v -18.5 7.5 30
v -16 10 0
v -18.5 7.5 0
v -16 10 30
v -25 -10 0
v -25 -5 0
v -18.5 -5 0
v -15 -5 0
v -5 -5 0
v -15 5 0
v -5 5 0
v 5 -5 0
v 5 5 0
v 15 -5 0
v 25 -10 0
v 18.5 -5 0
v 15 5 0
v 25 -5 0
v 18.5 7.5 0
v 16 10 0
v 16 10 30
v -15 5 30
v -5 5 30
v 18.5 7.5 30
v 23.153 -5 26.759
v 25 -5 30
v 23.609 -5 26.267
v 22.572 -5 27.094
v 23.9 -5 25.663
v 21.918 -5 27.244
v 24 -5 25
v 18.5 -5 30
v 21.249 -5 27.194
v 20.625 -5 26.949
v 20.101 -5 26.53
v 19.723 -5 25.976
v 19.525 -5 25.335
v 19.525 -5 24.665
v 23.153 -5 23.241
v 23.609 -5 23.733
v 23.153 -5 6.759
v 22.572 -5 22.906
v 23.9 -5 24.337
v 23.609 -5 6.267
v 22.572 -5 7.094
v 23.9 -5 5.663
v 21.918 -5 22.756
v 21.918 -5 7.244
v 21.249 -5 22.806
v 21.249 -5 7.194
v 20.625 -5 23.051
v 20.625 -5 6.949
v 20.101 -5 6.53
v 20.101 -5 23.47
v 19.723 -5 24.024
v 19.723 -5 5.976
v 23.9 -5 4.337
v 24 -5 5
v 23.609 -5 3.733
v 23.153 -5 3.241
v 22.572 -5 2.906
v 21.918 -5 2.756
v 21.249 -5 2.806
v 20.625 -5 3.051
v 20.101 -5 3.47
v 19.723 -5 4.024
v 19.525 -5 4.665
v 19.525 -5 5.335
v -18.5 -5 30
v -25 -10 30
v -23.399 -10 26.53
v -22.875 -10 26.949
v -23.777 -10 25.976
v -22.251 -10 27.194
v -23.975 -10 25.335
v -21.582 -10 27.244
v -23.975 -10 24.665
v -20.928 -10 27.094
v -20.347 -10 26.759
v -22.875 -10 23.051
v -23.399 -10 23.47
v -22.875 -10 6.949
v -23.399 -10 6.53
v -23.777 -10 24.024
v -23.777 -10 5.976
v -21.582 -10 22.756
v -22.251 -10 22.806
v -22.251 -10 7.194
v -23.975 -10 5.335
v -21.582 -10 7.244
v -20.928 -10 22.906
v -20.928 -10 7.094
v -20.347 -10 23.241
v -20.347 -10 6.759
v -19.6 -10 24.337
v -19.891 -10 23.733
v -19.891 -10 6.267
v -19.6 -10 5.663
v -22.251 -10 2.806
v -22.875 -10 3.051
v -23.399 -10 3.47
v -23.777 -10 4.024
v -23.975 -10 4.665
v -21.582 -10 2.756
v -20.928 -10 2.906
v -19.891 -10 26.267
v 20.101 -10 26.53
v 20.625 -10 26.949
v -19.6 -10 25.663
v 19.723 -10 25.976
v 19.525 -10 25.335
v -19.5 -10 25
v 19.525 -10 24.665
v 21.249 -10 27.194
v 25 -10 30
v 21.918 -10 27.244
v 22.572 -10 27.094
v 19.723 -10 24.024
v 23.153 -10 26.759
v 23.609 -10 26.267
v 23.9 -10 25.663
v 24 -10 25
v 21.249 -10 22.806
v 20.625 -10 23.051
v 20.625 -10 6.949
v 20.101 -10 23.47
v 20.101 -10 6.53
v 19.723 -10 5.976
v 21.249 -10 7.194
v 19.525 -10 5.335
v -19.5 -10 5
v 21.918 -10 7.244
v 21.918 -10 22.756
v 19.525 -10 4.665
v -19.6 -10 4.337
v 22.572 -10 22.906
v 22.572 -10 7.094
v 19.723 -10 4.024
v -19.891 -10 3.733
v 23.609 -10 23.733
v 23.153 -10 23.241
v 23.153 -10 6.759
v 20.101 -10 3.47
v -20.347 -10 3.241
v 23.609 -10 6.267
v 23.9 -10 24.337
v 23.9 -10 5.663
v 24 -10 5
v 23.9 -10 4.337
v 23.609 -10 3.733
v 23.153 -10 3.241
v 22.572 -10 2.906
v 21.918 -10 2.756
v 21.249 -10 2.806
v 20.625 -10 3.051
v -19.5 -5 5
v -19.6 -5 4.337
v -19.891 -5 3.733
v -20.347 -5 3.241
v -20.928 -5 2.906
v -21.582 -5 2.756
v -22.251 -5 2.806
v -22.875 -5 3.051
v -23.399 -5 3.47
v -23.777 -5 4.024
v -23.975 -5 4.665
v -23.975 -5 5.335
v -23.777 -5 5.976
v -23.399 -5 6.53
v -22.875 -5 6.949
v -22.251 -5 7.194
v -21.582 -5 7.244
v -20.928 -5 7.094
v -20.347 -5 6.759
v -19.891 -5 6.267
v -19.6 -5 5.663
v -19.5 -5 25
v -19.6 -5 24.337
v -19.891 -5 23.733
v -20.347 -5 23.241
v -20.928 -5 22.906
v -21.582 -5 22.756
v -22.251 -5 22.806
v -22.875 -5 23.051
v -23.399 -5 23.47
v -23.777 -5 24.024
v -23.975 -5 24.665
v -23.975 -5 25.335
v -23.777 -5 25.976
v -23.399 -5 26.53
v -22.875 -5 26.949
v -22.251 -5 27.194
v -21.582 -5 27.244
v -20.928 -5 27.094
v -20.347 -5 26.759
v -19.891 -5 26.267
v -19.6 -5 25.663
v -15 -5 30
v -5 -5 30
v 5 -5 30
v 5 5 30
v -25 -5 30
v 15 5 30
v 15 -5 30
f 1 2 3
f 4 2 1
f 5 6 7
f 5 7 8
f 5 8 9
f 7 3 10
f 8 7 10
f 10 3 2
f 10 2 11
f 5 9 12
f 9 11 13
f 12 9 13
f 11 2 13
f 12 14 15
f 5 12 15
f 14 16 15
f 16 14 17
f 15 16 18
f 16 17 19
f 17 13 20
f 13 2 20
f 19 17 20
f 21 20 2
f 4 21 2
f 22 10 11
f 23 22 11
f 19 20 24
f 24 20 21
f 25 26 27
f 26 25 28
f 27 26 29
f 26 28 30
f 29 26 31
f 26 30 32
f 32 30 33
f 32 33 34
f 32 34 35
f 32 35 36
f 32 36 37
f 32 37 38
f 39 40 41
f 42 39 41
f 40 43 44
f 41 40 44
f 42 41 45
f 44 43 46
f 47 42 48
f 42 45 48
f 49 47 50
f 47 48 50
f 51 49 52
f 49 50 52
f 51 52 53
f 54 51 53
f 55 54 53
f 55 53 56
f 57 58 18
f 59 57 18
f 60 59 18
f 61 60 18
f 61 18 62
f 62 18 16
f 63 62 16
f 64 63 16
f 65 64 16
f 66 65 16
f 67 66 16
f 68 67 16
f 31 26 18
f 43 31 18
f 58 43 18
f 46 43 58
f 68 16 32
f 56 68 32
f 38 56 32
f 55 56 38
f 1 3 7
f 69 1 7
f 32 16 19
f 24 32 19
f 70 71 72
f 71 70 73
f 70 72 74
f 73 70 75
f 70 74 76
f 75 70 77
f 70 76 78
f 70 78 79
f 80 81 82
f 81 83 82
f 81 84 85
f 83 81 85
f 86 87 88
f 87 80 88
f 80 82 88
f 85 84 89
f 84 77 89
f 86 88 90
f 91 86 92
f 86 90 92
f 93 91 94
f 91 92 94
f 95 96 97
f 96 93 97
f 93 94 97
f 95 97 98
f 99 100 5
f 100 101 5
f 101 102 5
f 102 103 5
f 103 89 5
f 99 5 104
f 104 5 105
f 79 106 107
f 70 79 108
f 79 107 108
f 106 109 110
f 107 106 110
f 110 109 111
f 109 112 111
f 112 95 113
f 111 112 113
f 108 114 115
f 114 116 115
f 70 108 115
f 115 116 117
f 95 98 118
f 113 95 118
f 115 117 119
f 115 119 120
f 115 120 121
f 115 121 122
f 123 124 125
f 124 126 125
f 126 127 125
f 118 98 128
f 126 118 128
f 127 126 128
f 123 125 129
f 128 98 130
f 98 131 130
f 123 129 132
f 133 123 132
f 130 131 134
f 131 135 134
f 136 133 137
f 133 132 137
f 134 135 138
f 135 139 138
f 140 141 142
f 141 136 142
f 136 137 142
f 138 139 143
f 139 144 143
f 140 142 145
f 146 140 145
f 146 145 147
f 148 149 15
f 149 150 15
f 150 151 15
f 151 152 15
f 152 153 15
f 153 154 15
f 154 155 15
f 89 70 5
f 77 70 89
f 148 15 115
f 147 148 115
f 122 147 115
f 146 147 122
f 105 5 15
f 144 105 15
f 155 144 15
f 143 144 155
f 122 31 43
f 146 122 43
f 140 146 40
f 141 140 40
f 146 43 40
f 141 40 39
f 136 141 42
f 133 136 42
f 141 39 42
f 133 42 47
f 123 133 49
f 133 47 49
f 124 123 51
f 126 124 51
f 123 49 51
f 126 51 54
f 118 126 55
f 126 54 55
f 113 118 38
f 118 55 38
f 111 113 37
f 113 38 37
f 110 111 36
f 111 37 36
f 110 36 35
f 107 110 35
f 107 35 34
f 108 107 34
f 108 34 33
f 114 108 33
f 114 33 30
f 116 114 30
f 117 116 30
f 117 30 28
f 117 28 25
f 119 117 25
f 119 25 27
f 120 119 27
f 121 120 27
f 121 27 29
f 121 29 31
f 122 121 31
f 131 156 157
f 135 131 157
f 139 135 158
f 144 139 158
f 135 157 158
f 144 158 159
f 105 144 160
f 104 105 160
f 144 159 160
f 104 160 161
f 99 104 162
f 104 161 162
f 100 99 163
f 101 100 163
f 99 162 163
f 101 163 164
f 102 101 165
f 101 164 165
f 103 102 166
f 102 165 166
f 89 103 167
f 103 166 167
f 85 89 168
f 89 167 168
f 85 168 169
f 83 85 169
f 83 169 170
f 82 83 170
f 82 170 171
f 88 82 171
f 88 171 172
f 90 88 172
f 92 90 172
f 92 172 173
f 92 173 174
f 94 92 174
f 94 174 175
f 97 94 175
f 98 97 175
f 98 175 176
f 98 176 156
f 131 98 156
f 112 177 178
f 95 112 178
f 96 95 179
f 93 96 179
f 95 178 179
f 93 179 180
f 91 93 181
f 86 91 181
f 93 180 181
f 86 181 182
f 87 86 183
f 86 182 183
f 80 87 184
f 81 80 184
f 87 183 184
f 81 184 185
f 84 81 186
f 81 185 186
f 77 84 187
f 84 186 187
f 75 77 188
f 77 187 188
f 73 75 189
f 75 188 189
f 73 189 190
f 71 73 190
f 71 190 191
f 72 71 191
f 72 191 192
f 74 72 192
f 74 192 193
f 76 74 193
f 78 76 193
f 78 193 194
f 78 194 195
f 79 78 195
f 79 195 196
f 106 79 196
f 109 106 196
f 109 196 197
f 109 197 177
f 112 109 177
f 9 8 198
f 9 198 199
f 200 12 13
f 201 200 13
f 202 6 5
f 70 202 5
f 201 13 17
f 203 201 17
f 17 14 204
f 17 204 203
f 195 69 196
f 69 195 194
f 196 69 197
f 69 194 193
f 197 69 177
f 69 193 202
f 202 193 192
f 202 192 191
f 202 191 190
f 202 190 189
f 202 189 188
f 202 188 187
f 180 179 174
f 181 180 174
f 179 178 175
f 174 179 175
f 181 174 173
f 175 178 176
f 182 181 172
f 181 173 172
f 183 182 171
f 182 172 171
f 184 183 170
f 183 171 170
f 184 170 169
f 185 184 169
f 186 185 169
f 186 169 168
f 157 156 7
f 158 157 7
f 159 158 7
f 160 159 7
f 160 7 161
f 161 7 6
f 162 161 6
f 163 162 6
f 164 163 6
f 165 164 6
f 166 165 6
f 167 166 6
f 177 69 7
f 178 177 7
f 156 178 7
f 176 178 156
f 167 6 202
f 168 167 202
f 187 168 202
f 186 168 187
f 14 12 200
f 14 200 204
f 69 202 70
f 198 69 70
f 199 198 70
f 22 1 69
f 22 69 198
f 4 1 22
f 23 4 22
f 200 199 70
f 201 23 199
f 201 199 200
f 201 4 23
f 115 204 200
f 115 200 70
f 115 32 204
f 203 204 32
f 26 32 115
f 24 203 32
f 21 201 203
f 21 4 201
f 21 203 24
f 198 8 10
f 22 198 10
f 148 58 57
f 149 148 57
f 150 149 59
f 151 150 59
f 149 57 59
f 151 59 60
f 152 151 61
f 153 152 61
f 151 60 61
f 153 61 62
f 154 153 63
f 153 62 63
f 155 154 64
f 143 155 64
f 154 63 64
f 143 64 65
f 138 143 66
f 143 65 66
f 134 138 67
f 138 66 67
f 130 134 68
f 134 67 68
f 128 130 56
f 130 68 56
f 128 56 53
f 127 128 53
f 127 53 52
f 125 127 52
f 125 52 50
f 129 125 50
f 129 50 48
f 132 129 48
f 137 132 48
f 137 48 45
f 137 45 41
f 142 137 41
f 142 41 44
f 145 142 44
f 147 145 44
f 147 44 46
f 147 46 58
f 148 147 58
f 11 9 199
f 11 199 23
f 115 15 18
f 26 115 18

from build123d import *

# Parameters (mm, degrees)
SKETCH2_W           = 10
SKETCH2_H           = 10
BOSS_EXTRUDE1_DEPTH = 30
CHAMFER1_SIZE       = 2.5
SKETCH3_R           = 2.25
CUT_EXTRUDE1_DEPTH  = 6


with BuildPart() as part:
    # Sketch2 → Boss-Extrude1 (new body)
    with BuildSketch(Plane.XY):
        Polygon((-25, -10), (25, -10), (25, -5), (18.5, -5), (18.5, 10), (-18.5, 10), (-18.5, -5), (-25, -5), align=None)
        with Locations((-10, 0)):
            Rectangle(SKETCH2_W, SKETCH2_H, mode=Mode.SUBTRACT)
        with Locations((10, 0)):
            Rectangle(SKETCH2_W, SKETCH2_H, mode=Mode.SUBTRACT)
    extrude(amount=BOSS_EXTRUDE1_DEPTH)

    # Chamfer1
    chamfer1_edges = [part.edges().sort_by_distance(p)[0] for p in [
        (-18.5, 10, 15),
        (18.5, 10, 15),
    ]]
    chamfer(chamfer1_edges, length=CHAMFER1_SIZE)

    # Sketch3 → Cut-Extrude1 (cut, through all)
    with BuildSketch(Plane(origin=(0, -5, 0), x_dir=(1, 0, 0), z_dir=(0, 1, 0))):
        with Locations((-21.75, -5)):
            Circle(SKETCH3_R)
        with Locations((-21.75, -25)):
            Circle(SKETCH3_R)
        with Locations((21.75, -25)):
            Circle(SKETCH3_R)
        with Locations((21.75, -5)):
            Circle(SKETCH3_R)
    extrude(amount=-CUT_EXTRUDE1_DEPTH, mode=Mode.SUBTRACT)


solid = part.part
